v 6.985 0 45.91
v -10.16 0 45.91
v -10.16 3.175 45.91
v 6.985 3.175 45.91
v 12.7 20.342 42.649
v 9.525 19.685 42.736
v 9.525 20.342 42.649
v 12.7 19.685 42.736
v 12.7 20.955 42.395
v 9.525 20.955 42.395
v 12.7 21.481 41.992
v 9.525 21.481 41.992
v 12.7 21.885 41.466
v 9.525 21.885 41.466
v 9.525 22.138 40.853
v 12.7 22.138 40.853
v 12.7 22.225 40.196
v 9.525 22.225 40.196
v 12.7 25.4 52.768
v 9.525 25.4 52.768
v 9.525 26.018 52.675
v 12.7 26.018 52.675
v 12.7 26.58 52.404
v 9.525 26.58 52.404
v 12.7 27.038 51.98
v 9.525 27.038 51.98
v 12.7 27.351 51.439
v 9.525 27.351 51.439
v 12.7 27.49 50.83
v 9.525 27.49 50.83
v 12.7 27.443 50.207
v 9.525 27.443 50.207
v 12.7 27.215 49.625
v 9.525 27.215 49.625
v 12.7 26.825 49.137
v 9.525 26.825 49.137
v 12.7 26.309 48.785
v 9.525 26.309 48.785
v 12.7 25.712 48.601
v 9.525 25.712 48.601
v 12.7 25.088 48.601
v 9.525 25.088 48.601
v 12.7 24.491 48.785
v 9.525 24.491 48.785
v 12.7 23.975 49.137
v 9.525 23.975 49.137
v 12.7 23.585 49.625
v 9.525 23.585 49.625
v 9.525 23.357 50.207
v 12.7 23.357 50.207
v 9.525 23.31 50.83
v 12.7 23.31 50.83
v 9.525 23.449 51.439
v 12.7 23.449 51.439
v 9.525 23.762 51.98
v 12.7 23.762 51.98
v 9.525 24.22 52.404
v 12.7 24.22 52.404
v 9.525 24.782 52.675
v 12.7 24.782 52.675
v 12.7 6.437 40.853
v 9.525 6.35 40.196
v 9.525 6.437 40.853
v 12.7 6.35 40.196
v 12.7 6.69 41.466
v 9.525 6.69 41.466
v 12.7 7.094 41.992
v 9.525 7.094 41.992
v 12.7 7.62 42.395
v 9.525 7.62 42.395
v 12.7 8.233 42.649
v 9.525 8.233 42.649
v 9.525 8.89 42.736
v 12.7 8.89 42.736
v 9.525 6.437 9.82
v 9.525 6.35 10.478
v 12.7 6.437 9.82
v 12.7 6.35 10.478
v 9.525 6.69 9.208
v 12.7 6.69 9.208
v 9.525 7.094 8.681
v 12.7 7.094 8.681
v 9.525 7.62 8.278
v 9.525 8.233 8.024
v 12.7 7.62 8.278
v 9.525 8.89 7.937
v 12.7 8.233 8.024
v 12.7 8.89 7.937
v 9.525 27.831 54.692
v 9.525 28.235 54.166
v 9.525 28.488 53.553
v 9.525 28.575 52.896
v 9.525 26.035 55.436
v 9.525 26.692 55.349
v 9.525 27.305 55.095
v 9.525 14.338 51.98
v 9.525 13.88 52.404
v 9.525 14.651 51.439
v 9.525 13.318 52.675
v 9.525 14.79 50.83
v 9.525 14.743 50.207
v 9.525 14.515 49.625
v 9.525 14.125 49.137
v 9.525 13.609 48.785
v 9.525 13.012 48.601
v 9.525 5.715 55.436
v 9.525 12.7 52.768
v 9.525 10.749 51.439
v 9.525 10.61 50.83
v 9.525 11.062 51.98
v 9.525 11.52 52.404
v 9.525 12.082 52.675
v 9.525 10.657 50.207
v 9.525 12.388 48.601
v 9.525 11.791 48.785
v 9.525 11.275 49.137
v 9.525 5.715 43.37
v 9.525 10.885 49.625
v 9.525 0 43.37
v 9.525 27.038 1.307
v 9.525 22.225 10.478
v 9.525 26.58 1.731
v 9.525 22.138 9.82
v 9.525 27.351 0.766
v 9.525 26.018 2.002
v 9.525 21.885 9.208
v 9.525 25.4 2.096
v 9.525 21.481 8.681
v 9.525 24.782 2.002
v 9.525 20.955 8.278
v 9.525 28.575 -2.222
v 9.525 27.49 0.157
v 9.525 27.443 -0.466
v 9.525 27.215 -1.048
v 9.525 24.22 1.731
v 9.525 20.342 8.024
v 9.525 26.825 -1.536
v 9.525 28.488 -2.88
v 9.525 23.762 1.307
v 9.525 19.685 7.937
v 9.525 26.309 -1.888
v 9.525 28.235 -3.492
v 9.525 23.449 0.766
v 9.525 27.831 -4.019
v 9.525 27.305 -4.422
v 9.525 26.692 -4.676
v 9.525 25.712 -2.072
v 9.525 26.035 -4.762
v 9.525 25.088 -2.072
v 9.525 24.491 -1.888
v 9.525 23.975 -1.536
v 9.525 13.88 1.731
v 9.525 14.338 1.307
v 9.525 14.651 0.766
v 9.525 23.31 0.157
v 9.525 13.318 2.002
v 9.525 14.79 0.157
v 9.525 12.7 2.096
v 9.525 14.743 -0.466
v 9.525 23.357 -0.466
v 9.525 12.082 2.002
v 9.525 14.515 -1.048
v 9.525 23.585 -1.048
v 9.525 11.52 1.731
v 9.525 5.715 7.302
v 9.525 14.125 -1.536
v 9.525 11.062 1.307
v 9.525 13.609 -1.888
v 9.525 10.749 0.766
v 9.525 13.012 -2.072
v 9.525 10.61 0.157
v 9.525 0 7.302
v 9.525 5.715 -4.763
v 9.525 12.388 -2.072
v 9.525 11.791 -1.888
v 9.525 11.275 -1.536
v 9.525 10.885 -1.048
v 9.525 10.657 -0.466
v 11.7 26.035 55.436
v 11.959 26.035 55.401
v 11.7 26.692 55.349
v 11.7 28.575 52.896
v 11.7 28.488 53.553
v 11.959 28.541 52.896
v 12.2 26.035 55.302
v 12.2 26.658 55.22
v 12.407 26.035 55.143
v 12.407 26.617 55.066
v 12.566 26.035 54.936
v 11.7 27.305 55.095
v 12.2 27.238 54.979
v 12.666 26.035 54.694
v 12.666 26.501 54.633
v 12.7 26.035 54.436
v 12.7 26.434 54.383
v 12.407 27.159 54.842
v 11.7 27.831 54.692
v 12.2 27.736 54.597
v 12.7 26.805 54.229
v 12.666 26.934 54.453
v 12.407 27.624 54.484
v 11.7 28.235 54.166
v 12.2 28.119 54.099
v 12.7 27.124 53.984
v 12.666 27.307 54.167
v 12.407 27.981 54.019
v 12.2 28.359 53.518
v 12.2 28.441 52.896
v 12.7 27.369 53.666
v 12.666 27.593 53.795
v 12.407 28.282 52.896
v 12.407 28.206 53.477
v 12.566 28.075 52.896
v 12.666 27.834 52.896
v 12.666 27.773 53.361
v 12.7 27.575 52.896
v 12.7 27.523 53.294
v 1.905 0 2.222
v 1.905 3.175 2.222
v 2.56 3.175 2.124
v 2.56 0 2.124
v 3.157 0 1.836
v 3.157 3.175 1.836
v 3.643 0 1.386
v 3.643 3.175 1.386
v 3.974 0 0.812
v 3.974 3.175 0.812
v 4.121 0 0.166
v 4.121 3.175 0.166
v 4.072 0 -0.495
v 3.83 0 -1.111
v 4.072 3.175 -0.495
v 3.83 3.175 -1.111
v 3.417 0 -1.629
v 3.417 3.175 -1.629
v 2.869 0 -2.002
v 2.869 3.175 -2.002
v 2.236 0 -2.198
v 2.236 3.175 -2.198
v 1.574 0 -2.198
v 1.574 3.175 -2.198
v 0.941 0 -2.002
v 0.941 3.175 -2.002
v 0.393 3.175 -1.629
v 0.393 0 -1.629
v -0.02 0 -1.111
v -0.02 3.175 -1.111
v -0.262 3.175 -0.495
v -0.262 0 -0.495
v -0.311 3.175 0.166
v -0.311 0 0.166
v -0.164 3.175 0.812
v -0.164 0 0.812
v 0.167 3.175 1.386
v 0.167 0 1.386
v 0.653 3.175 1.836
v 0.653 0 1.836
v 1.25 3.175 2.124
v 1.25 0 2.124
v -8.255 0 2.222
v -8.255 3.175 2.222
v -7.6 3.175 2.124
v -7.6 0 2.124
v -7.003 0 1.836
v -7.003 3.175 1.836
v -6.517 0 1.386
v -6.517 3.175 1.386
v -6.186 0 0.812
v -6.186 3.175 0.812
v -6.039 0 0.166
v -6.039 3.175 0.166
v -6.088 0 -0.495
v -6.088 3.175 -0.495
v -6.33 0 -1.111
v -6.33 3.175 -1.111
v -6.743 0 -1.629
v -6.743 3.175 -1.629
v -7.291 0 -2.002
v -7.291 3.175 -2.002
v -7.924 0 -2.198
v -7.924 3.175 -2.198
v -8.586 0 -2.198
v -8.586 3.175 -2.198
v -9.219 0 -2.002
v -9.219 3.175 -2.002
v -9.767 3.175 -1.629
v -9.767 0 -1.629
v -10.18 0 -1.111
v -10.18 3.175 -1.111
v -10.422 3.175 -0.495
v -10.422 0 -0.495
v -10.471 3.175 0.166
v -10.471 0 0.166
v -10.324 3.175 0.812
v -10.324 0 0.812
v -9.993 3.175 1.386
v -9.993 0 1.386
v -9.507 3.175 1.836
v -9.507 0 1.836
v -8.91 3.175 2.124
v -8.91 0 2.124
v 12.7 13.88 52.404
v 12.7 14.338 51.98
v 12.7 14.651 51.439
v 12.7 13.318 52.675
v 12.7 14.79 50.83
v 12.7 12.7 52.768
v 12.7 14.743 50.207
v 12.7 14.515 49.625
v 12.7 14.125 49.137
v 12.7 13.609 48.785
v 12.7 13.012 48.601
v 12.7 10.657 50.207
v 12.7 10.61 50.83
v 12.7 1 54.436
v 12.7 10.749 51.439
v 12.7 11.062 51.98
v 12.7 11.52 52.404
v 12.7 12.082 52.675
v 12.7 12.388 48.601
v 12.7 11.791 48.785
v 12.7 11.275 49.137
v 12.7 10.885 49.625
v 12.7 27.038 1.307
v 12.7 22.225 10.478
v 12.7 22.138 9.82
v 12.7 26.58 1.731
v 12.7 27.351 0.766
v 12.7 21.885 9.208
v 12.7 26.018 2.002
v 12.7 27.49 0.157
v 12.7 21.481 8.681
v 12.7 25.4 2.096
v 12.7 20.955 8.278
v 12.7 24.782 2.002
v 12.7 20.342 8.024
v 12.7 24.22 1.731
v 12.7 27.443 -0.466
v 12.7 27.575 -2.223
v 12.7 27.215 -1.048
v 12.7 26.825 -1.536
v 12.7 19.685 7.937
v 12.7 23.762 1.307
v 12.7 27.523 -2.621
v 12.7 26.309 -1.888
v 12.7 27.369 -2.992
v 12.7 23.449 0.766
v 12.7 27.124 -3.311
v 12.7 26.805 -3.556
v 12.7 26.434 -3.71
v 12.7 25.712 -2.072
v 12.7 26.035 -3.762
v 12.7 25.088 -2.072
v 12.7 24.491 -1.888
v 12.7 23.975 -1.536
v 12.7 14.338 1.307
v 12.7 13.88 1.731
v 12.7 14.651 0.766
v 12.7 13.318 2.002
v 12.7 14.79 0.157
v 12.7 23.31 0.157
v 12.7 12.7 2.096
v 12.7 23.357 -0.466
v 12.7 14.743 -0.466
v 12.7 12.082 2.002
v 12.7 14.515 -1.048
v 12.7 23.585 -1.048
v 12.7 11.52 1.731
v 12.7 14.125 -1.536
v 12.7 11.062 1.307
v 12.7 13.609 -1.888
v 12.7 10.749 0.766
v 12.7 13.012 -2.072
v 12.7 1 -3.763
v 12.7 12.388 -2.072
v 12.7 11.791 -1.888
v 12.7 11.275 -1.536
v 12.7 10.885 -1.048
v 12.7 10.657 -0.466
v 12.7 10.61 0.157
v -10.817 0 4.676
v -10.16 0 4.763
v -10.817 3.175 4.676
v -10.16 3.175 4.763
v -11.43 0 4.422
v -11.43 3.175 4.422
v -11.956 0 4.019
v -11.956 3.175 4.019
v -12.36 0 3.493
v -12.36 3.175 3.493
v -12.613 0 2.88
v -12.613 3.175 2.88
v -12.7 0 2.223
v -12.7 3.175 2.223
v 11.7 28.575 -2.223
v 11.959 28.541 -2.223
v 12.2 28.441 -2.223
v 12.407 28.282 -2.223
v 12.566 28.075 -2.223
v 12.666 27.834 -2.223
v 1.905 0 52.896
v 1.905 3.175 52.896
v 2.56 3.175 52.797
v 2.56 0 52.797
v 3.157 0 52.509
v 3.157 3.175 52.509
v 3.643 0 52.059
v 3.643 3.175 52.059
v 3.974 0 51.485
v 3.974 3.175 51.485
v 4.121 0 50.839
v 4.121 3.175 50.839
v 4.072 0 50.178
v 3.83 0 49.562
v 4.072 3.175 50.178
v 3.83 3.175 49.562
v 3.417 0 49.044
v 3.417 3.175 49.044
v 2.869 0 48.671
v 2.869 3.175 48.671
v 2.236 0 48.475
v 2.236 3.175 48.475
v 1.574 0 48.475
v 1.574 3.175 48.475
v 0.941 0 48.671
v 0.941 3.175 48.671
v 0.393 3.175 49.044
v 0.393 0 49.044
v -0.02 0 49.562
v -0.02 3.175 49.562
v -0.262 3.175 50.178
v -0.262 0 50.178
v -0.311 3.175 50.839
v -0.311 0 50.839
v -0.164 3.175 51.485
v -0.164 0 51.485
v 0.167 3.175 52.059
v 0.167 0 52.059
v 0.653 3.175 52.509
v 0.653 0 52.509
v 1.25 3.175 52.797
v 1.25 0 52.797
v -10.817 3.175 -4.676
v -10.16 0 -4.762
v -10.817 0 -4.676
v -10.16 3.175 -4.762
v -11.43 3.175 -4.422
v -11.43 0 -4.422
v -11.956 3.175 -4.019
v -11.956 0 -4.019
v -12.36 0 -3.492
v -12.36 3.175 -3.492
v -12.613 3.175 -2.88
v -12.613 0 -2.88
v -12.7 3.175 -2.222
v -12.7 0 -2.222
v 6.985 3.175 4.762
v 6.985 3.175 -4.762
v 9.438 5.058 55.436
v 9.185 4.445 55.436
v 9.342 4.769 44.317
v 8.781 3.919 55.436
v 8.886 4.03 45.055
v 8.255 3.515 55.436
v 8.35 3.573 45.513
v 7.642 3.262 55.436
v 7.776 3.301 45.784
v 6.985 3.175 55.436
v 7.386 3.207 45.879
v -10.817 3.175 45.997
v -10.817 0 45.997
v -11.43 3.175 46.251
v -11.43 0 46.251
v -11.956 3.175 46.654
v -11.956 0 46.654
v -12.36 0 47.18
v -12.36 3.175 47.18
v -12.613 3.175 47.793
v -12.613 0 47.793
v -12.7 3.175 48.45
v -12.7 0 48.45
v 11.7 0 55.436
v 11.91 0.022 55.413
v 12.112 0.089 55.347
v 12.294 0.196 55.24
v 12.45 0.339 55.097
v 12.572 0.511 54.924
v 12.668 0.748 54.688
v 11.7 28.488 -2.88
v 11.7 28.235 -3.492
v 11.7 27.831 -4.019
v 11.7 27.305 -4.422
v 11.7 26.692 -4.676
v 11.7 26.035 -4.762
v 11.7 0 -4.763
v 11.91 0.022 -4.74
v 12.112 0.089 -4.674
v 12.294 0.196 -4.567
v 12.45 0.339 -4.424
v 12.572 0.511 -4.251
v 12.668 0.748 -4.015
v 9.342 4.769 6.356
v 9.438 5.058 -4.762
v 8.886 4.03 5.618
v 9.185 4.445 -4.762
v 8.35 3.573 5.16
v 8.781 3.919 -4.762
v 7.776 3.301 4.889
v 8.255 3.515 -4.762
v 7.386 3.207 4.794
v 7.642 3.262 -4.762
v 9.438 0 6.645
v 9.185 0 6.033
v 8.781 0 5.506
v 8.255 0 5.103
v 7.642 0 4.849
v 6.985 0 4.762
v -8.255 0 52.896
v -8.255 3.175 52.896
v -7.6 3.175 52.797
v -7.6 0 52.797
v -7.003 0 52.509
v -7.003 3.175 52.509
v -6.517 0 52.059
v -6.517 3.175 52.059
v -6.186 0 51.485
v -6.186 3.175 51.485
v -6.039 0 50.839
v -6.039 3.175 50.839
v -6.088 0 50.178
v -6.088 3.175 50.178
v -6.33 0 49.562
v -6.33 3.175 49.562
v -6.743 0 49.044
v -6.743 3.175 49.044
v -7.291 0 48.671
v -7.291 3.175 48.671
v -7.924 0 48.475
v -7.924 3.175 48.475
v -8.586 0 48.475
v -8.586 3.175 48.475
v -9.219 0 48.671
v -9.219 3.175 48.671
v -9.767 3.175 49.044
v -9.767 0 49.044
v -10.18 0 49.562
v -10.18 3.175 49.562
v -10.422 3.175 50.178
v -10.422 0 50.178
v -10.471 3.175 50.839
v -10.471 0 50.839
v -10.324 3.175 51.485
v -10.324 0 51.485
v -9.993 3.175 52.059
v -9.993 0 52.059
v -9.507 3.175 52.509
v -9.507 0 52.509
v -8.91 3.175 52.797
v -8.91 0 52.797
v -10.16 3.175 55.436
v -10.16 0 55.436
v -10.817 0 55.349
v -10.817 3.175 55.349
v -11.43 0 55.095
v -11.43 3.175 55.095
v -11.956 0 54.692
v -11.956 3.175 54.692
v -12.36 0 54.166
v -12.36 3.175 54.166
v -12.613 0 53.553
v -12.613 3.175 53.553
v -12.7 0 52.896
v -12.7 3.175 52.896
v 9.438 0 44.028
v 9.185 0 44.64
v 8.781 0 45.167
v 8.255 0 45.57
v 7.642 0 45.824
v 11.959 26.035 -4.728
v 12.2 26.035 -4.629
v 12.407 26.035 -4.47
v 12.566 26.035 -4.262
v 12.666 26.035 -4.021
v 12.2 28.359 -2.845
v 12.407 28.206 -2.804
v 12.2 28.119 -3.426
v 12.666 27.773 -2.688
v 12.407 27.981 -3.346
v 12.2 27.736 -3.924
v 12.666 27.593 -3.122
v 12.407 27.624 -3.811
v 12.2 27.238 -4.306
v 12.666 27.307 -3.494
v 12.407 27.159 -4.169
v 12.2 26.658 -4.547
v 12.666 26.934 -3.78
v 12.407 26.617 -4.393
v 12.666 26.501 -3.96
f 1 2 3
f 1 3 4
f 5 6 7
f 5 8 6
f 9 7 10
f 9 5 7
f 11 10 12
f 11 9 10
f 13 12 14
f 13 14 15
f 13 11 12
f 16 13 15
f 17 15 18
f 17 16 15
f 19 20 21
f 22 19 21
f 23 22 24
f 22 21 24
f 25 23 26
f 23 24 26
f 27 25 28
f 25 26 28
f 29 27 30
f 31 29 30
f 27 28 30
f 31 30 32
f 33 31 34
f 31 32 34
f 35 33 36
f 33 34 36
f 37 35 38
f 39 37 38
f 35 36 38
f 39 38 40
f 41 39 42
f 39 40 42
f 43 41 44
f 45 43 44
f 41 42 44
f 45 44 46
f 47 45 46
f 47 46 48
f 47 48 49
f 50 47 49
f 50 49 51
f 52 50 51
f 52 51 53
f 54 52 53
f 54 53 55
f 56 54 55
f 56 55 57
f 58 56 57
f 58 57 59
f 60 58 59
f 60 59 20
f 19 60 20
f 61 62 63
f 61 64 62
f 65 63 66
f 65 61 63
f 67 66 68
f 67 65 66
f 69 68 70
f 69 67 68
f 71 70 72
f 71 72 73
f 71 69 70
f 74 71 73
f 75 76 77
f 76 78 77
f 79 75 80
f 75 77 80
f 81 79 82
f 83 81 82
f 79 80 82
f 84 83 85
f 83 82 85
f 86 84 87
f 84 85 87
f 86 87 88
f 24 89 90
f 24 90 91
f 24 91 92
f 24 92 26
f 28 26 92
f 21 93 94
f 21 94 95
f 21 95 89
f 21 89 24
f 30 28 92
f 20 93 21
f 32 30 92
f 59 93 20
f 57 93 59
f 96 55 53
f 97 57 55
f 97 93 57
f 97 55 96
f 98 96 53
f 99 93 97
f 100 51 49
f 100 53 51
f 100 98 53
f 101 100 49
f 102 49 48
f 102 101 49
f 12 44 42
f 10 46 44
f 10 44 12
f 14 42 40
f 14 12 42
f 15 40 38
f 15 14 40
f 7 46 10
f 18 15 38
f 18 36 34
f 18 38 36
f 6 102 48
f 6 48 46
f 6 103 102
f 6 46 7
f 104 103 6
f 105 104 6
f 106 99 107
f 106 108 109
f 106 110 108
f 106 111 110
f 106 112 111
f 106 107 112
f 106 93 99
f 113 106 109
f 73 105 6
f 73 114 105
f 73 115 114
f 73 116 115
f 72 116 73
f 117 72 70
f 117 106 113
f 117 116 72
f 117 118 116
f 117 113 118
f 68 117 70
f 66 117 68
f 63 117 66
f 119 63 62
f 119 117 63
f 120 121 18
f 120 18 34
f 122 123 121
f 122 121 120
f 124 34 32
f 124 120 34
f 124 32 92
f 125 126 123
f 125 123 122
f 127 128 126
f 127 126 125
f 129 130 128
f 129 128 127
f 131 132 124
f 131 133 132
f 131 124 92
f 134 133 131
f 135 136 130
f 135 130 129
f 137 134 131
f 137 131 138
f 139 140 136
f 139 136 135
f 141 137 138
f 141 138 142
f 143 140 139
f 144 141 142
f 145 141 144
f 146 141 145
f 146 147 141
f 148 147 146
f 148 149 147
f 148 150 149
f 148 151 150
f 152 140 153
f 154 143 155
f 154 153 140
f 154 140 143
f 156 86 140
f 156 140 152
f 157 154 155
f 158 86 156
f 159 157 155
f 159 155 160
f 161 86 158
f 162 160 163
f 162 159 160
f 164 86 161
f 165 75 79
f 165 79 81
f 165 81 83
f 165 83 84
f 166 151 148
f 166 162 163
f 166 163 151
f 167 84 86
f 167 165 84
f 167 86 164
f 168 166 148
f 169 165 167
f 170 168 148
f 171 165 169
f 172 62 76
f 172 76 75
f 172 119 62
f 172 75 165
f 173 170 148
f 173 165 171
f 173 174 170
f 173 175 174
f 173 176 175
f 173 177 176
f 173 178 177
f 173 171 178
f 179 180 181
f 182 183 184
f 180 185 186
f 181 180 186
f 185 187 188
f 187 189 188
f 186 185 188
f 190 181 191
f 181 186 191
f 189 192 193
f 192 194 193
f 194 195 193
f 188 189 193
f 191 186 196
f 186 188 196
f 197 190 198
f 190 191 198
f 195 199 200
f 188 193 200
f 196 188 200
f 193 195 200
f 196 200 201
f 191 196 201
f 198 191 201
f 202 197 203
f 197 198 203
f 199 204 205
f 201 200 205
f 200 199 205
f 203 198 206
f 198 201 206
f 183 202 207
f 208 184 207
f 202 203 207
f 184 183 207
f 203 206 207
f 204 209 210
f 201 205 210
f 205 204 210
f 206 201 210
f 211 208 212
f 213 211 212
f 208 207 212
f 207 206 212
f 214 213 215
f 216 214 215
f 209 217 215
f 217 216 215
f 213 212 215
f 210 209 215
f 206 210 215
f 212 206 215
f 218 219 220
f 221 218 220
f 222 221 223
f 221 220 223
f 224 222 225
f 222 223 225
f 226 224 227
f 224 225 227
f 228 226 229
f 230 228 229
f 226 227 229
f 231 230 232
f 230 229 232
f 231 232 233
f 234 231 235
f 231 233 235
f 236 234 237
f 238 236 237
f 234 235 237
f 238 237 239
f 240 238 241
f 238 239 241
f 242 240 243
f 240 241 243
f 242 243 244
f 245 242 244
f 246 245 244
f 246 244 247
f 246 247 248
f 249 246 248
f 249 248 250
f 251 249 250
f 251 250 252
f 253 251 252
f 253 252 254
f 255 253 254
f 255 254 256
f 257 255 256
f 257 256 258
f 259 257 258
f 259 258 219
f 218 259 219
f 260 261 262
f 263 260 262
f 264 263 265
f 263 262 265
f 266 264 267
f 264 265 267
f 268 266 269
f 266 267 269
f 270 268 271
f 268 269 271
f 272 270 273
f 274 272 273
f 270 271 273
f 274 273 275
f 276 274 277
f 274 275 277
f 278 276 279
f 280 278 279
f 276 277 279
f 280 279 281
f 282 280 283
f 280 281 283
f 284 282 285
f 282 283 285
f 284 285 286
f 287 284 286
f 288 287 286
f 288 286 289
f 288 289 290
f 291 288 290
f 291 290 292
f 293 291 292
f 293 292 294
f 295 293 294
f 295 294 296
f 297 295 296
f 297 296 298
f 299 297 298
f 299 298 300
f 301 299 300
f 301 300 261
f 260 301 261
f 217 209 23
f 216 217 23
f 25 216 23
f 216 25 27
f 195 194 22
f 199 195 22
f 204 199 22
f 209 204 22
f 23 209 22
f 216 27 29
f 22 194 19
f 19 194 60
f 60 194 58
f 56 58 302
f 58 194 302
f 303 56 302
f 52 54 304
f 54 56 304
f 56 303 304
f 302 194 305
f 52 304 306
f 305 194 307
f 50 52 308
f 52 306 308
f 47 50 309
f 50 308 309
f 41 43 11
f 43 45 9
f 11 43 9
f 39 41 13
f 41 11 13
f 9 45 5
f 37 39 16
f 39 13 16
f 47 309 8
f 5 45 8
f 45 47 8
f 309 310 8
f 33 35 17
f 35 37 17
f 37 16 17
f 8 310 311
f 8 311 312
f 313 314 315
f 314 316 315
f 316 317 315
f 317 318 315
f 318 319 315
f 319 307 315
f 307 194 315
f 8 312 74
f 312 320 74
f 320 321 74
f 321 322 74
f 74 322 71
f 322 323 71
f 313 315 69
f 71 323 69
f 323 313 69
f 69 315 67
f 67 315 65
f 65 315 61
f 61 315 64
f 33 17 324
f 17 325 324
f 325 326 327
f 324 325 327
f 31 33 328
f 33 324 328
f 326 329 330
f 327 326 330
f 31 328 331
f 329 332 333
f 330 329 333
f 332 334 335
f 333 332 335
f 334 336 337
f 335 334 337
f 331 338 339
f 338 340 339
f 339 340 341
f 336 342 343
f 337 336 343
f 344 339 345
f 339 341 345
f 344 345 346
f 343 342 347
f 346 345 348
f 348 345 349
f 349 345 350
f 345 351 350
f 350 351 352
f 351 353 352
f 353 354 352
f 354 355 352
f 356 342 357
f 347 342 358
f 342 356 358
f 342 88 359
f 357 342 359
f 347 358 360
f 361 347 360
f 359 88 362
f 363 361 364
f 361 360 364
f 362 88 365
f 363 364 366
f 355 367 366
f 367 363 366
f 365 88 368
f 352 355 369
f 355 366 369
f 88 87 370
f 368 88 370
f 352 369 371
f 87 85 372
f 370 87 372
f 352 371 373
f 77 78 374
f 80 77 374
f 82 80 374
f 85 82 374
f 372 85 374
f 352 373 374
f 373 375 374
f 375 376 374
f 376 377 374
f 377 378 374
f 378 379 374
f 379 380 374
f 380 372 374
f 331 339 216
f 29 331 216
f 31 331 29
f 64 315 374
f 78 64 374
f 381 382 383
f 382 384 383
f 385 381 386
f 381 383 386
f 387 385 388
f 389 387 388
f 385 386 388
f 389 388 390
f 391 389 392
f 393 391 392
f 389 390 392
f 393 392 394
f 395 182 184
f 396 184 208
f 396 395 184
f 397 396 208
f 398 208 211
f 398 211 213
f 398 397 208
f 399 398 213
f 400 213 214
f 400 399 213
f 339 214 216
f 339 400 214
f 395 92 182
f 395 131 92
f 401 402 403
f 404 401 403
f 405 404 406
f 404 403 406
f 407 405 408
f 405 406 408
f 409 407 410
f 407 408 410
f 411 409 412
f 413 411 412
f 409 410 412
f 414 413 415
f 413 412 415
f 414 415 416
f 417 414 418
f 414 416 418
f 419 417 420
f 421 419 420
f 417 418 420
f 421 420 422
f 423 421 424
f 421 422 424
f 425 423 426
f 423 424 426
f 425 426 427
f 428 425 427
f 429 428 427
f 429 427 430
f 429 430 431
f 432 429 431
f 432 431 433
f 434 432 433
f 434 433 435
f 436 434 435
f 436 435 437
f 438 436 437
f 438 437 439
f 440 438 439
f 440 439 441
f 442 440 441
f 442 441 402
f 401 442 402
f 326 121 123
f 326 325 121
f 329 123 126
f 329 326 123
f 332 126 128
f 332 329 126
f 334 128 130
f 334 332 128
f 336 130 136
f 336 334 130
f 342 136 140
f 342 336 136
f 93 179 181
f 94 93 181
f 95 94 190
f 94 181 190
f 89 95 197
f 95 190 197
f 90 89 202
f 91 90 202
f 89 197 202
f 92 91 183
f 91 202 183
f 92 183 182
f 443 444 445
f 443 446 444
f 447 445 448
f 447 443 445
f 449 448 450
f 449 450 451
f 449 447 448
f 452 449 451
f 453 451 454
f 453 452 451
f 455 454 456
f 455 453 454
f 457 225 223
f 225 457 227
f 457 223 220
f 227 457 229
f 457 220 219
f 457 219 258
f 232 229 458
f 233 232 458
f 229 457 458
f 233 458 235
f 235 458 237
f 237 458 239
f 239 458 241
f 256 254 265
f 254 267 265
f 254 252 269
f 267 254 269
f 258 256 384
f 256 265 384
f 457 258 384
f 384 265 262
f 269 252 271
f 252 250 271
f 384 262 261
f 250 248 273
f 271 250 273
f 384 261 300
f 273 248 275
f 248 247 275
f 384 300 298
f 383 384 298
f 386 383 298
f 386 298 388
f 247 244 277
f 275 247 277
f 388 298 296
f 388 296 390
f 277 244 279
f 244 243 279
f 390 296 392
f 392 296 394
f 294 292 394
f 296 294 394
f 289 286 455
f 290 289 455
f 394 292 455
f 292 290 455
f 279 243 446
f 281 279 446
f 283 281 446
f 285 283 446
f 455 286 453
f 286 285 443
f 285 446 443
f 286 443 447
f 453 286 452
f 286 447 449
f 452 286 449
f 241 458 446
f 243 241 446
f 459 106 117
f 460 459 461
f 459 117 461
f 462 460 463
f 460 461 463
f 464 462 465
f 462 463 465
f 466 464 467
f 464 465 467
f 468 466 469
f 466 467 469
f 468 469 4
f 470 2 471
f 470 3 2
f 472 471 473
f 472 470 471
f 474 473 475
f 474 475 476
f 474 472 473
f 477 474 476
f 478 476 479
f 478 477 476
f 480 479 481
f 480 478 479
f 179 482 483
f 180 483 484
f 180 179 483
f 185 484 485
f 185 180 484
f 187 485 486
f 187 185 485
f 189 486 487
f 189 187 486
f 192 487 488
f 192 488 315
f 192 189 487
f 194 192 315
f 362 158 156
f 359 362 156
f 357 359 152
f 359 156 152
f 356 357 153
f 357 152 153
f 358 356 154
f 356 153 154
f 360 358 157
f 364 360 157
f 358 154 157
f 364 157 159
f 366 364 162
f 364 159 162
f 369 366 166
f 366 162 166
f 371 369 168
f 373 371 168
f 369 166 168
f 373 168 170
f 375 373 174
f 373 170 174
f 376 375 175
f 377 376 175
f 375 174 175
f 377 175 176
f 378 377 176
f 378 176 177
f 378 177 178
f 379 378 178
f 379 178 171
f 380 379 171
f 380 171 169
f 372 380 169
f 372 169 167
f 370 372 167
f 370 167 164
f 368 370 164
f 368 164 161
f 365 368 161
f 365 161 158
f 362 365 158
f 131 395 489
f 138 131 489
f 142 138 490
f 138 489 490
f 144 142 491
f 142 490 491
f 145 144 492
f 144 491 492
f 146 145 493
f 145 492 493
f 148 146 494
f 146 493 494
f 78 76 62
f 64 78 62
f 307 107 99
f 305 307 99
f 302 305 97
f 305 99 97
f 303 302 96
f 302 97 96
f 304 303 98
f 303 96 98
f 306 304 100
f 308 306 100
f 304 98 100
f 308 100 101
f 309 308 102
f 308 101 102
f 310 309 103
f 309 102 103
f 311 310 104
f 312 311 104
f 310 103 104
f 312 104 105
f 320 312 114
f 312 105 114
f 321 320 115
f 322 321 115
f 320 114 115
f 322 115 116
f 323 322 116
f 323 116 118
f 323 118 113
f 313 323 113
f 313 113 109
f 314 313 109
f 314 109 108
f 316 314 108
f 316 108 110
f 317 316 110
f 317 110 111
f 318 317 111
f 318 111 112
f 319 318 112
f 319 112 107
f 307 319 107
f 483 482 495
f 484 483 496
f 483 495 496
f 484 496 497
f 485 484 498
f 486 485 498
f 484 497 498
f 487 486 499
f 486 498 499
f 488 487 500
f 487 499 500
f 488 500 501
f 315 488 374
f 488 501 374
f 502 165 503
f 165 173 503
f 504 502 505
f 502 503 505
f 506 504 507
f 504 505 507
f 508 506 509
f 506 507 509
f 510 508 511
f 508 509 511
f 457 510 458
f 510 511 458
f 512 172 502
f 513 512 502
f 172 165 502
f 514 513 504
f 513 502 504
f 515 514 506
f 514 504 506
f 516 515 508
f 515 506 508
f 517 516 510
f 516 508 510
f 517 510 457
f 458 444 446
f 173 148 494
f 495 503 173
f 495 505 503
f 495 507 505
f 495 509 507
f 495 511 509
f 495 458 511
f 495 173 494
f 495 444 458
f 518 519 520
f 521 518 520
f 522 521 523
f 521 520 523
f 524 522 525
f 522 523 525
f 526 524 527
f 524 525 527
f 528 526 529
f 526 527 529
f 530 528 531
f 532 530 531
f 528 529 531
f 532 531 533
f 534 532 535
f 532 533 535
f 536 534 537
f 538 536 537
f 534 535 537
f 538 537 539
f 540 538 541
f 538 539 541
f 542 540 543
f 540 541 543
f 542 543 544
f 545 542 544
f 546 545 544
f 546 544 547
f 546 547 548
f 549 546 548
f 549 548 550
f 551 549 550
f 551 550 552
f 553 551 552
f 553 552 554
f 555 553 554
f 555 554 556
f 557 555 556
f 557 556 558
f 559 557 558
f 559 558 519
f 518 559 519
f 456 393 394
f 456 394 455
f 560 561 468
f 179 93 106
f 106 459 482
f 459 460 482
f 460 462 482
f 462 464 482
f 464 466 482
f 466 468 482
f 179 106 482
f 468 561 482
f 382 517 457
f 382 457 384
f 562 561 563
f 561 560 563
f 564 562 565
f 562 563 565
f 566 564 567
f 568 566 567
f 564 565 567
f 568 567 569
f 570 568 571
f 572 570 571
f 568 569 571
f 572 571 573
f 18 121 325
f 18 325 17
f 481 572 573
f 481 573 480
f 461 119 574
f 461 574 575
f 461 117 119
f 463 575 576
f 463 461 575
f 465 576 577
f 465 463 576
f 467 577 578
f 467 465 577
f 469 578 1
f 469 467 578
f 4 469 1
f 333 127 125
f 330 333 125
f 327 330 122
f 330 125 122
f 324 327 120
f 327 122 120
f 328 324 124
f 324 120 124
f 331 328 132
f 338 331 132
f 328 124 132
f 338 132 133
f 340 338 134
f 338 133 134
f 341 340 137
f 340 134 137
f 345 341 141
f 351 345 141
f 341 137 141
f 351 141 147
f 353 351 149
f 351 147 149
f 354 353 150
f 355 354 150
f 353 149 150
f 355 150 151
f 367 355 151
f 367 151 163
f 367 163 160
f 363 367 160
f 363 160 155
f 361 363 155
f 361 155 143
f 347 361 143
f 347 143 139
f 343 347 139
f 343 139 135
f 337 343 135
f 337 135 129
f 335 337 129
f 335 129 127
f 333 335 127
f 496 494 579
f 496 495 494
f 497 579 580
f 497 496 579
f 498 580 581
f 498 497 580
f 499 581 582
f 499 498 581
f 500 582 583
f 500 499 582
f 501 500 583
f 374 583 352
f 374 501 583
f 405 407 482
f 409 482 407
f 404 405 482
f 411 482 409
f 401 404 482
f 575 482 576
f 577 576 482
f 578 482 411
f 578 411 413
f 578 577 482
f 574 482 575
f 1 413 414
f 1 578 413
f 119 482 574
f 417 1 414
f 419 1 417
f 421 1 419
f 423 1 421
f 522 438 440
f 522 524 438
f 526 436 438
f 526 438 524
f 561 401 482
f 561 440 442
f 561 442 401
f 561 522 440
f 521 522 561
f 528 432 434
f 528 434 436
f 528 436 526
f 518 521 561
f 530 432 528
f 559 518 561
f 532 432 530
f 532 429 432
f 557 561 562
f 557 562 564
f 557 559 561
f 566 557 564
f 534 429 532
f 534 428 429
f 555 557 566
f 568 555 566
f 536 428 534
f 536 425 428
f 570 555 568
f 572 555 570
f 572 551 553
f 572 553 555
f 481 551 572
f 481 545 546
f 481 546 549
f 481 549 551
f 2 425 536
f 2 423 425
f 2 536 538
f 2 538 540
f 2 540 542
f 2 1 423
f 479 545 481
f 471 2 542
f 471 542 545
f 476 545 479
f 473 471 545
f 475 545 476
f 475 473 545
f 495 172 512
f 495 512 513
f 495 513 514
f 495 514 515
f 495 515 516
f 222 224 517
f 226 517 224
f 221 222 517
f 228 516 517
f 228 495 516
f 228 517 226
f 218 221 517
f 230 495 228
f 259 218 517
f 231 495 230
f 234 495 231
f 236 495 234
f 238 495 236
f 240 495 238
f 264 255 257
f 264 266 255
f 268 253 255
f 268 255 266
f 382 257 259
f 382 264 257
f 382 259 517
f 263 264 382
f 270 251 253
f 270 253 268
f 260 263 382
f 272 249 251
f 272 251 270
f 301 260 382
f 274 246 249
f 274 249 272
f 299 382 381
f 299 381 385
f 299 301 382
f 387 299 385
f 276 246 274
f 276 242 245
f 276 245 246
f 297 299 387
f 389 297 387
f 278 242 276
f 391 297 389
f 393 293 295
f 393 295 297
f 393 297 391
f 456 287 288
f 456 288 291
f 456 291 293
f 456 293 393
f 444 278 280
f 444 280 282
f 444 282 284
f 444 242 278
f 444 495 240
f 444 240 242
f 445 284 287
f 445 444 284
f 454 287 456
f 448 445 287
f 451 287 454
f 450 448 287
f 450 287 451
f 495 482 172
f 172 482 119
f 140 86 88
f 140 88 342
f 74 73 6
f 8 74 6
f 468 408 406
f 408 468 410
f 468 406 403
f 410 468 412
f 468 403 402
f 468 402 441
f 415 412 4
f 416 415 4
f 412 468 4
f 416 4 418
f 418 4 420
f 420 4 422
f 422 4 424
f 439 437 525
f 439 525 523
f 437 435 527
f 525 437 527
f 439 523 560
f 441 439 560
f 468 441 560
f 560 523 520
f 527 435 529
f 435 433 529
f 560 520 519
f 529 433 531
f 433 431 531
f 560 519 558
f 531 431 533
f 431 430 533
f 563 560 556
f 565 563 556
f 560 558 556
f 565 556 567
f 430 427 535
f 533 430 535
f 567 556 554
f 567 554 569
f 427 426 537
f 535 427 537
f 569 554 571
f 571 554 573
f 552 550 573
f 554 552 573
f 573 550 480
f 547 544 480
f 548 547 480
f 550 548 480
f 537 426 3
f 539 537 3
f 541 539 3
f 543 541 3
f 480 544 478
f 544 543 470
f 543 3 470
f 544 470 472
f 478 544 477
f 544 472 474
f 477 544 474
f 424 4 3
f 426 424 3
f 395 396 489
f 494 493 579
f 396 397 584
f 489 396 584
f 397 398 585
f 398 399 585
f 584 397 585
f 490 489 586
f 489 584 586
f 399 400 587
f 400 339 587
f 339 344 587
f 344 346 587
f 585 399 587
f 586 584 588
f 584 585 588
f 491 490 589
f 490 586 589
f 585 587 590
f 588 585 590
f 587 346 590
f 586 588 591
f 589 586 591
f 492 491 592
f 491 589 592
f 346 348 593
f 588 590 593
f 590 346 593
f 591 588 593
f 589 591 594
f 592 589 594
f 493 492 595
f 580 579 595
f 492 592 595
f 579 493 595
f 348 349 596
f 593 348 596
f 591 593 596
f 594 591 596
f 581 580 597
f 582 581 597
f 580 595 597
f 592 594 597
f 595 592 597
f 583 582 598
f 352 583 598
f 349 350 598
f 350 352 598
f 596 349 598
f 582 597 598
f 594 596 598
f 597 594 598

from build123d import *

# Parameters (mm, degrees)
BOSS_EXTRUDE1_DEPTH = 3.175
SKETCH2_R           = 2.2225
CUT_EXTRUDE1_DEPTH  = 57.960207911
SKETCH5_W           = 3.175
SKETCH5_H           = 60.198
BOSS_EXTRUDE3_DEPTH = 25.4
SKETCH6_R           = 2.0955
CUT_EXTRUDE3_DEPTH  = 67.208578827
SKETCH8_W           = 34.798
SKETCH8_H           = 15.875
CUT_EXTRUDE4_DEPTH  = 67.208578827
FILLET1_R           = 2.54
FILLET2_R           = 1


with BuildPart() as part:
    # Sketch1 → Boss-Extrude1 (new body)
    with BuildSketch(Plane(origin=(0, 0, 0), x_dir=(1, 0, 0), z_dir=(0, 1, 0))):
        Polygon((-12.7, -4.7625), (-12.7, 4.7625), (12.7, 4.7625), (12.7, -4.7625), (12.7, -45.9105), (12.7, -55.4355), (-12.7, -55.4355), (-12.7, -45.9105), (9.525, -45.9105), (9.525, -4.7625), align=None)
    extrude(amount=BOSS_EXTRUDE1_DEPTH)

    # Sketch2 → Cut-Extrude1 (cut, through all)
    with BuildSketch(Plane(origin=(0, 3.175, 0), x_dir=(1, 0, 0), z_dir=(0, 1, 0))):
        with Locations(Location((-8.255, 0, 0), (0, 0, 270))):
            Circle(SKETCH2_R)
        with Locations(Location((1.905, 0, 0), (0, 0, 270))):
            Circle(SKETCH2_R)
        with Locations(Location((-8.255, -50.673, 0), (0, 0, 270))):
            Circle(SKETCH2_R)
        with Locations(Location((1.905, -50.673, 0), (0, 0, 270))):
            Circle(SKETCH2_R)
    extrude(amount=-CUT_EXTRUDE1_DEPTH, mode=Mode.SUBTRACT)

    # Sketch5 → Boss-Extrude3 (add)
    with BuildSketch(Plane(origin=(0, 3.175, 0), x_dir=(1, 0, 0), z_dir=(0, 1, 0))):
        with Locations((11.1125, -25.3365)):
            Rectangle(SKETCH5_W, SKETCH5_H)
    extrude(amount=BOSS_EXTRUDE3_DEPTH)

    # Sketch6 → Cut-Extrude3 (cut, through all)
    with BuildSketch(Plane.ZY.offset(-9.525)):
        with Locations((0, 25.4)):
            Circle(SKETCH6_R)
        with Locations((0, 12.7)):
            Circle(SKETCH6_R)
        with Locations((50.673, 25.4)):
            Circle(SKETCH6_R)
        with Locations((50.673, 12.7)):
            Circle(SKETCH6_R)
    extrude(amount=-CUT_EXTRUDE3_DEPTH, mode=Mode.SUBTRACT)

    # Sketch8 → Cut-Extrude4 (cut, through all)
    with BuildSketch(Plane.ZY.offset(-9.525)):
        with Locations((25.3365, 14.2875)):
            Rectangle(SKETCH8_W, SKETCH8_H)
    extrude(amount=-CUT_EXTRUDE4_DEPTH, mode=Mode.SUBTRACT)

    # Fillet1
    fillet1_edges = [part.edges().sort_by_distance(p)[0] for p in [
        (-12.7, 1.5875, 4.7625),
        (-12.7, 1.5875, -4.7625),
        (11.1125, 28.575, -4.7625),
        (11.1125, 28.575, 55.4355),
        (-12.7, 1.5875, 55.4355),
        (-12.7, 1.5875, 45.9105),
        (9.525, 1.5875, 45.9105),
        (9.525, 1.5875, 4.7625),
        (9.525, 3.175, 0),
        (9.525, 3.175, 50.673),
        (11.1125, 6.35, 42.7355),
        (11.1125, 22.225, 42.7355),
        (11.1125, 22.225, 7.9375),
        (11.1125, 6.35, 7.9375),
    ]]
    fillet(fillet1_edges, radius=FILLET1_R)

    # Fillet2
    fillet2_edges = [part.edges().sort_by_distance(p)[0] for p in [
        (12.7, 13.0175, -4.7625),
        (12.7, 28.575, 25.3365),
        (12.7, 13.0175, 55.4355),
        (12.7, 27.831051224, 54.691551224),
        (12.7, 27.831051224, -4.018551224),
        (12.7, 0, 25.3365),
    ]]
    fillet(fillet2_edges, radius=FILLET2_R)


solid = part.part
